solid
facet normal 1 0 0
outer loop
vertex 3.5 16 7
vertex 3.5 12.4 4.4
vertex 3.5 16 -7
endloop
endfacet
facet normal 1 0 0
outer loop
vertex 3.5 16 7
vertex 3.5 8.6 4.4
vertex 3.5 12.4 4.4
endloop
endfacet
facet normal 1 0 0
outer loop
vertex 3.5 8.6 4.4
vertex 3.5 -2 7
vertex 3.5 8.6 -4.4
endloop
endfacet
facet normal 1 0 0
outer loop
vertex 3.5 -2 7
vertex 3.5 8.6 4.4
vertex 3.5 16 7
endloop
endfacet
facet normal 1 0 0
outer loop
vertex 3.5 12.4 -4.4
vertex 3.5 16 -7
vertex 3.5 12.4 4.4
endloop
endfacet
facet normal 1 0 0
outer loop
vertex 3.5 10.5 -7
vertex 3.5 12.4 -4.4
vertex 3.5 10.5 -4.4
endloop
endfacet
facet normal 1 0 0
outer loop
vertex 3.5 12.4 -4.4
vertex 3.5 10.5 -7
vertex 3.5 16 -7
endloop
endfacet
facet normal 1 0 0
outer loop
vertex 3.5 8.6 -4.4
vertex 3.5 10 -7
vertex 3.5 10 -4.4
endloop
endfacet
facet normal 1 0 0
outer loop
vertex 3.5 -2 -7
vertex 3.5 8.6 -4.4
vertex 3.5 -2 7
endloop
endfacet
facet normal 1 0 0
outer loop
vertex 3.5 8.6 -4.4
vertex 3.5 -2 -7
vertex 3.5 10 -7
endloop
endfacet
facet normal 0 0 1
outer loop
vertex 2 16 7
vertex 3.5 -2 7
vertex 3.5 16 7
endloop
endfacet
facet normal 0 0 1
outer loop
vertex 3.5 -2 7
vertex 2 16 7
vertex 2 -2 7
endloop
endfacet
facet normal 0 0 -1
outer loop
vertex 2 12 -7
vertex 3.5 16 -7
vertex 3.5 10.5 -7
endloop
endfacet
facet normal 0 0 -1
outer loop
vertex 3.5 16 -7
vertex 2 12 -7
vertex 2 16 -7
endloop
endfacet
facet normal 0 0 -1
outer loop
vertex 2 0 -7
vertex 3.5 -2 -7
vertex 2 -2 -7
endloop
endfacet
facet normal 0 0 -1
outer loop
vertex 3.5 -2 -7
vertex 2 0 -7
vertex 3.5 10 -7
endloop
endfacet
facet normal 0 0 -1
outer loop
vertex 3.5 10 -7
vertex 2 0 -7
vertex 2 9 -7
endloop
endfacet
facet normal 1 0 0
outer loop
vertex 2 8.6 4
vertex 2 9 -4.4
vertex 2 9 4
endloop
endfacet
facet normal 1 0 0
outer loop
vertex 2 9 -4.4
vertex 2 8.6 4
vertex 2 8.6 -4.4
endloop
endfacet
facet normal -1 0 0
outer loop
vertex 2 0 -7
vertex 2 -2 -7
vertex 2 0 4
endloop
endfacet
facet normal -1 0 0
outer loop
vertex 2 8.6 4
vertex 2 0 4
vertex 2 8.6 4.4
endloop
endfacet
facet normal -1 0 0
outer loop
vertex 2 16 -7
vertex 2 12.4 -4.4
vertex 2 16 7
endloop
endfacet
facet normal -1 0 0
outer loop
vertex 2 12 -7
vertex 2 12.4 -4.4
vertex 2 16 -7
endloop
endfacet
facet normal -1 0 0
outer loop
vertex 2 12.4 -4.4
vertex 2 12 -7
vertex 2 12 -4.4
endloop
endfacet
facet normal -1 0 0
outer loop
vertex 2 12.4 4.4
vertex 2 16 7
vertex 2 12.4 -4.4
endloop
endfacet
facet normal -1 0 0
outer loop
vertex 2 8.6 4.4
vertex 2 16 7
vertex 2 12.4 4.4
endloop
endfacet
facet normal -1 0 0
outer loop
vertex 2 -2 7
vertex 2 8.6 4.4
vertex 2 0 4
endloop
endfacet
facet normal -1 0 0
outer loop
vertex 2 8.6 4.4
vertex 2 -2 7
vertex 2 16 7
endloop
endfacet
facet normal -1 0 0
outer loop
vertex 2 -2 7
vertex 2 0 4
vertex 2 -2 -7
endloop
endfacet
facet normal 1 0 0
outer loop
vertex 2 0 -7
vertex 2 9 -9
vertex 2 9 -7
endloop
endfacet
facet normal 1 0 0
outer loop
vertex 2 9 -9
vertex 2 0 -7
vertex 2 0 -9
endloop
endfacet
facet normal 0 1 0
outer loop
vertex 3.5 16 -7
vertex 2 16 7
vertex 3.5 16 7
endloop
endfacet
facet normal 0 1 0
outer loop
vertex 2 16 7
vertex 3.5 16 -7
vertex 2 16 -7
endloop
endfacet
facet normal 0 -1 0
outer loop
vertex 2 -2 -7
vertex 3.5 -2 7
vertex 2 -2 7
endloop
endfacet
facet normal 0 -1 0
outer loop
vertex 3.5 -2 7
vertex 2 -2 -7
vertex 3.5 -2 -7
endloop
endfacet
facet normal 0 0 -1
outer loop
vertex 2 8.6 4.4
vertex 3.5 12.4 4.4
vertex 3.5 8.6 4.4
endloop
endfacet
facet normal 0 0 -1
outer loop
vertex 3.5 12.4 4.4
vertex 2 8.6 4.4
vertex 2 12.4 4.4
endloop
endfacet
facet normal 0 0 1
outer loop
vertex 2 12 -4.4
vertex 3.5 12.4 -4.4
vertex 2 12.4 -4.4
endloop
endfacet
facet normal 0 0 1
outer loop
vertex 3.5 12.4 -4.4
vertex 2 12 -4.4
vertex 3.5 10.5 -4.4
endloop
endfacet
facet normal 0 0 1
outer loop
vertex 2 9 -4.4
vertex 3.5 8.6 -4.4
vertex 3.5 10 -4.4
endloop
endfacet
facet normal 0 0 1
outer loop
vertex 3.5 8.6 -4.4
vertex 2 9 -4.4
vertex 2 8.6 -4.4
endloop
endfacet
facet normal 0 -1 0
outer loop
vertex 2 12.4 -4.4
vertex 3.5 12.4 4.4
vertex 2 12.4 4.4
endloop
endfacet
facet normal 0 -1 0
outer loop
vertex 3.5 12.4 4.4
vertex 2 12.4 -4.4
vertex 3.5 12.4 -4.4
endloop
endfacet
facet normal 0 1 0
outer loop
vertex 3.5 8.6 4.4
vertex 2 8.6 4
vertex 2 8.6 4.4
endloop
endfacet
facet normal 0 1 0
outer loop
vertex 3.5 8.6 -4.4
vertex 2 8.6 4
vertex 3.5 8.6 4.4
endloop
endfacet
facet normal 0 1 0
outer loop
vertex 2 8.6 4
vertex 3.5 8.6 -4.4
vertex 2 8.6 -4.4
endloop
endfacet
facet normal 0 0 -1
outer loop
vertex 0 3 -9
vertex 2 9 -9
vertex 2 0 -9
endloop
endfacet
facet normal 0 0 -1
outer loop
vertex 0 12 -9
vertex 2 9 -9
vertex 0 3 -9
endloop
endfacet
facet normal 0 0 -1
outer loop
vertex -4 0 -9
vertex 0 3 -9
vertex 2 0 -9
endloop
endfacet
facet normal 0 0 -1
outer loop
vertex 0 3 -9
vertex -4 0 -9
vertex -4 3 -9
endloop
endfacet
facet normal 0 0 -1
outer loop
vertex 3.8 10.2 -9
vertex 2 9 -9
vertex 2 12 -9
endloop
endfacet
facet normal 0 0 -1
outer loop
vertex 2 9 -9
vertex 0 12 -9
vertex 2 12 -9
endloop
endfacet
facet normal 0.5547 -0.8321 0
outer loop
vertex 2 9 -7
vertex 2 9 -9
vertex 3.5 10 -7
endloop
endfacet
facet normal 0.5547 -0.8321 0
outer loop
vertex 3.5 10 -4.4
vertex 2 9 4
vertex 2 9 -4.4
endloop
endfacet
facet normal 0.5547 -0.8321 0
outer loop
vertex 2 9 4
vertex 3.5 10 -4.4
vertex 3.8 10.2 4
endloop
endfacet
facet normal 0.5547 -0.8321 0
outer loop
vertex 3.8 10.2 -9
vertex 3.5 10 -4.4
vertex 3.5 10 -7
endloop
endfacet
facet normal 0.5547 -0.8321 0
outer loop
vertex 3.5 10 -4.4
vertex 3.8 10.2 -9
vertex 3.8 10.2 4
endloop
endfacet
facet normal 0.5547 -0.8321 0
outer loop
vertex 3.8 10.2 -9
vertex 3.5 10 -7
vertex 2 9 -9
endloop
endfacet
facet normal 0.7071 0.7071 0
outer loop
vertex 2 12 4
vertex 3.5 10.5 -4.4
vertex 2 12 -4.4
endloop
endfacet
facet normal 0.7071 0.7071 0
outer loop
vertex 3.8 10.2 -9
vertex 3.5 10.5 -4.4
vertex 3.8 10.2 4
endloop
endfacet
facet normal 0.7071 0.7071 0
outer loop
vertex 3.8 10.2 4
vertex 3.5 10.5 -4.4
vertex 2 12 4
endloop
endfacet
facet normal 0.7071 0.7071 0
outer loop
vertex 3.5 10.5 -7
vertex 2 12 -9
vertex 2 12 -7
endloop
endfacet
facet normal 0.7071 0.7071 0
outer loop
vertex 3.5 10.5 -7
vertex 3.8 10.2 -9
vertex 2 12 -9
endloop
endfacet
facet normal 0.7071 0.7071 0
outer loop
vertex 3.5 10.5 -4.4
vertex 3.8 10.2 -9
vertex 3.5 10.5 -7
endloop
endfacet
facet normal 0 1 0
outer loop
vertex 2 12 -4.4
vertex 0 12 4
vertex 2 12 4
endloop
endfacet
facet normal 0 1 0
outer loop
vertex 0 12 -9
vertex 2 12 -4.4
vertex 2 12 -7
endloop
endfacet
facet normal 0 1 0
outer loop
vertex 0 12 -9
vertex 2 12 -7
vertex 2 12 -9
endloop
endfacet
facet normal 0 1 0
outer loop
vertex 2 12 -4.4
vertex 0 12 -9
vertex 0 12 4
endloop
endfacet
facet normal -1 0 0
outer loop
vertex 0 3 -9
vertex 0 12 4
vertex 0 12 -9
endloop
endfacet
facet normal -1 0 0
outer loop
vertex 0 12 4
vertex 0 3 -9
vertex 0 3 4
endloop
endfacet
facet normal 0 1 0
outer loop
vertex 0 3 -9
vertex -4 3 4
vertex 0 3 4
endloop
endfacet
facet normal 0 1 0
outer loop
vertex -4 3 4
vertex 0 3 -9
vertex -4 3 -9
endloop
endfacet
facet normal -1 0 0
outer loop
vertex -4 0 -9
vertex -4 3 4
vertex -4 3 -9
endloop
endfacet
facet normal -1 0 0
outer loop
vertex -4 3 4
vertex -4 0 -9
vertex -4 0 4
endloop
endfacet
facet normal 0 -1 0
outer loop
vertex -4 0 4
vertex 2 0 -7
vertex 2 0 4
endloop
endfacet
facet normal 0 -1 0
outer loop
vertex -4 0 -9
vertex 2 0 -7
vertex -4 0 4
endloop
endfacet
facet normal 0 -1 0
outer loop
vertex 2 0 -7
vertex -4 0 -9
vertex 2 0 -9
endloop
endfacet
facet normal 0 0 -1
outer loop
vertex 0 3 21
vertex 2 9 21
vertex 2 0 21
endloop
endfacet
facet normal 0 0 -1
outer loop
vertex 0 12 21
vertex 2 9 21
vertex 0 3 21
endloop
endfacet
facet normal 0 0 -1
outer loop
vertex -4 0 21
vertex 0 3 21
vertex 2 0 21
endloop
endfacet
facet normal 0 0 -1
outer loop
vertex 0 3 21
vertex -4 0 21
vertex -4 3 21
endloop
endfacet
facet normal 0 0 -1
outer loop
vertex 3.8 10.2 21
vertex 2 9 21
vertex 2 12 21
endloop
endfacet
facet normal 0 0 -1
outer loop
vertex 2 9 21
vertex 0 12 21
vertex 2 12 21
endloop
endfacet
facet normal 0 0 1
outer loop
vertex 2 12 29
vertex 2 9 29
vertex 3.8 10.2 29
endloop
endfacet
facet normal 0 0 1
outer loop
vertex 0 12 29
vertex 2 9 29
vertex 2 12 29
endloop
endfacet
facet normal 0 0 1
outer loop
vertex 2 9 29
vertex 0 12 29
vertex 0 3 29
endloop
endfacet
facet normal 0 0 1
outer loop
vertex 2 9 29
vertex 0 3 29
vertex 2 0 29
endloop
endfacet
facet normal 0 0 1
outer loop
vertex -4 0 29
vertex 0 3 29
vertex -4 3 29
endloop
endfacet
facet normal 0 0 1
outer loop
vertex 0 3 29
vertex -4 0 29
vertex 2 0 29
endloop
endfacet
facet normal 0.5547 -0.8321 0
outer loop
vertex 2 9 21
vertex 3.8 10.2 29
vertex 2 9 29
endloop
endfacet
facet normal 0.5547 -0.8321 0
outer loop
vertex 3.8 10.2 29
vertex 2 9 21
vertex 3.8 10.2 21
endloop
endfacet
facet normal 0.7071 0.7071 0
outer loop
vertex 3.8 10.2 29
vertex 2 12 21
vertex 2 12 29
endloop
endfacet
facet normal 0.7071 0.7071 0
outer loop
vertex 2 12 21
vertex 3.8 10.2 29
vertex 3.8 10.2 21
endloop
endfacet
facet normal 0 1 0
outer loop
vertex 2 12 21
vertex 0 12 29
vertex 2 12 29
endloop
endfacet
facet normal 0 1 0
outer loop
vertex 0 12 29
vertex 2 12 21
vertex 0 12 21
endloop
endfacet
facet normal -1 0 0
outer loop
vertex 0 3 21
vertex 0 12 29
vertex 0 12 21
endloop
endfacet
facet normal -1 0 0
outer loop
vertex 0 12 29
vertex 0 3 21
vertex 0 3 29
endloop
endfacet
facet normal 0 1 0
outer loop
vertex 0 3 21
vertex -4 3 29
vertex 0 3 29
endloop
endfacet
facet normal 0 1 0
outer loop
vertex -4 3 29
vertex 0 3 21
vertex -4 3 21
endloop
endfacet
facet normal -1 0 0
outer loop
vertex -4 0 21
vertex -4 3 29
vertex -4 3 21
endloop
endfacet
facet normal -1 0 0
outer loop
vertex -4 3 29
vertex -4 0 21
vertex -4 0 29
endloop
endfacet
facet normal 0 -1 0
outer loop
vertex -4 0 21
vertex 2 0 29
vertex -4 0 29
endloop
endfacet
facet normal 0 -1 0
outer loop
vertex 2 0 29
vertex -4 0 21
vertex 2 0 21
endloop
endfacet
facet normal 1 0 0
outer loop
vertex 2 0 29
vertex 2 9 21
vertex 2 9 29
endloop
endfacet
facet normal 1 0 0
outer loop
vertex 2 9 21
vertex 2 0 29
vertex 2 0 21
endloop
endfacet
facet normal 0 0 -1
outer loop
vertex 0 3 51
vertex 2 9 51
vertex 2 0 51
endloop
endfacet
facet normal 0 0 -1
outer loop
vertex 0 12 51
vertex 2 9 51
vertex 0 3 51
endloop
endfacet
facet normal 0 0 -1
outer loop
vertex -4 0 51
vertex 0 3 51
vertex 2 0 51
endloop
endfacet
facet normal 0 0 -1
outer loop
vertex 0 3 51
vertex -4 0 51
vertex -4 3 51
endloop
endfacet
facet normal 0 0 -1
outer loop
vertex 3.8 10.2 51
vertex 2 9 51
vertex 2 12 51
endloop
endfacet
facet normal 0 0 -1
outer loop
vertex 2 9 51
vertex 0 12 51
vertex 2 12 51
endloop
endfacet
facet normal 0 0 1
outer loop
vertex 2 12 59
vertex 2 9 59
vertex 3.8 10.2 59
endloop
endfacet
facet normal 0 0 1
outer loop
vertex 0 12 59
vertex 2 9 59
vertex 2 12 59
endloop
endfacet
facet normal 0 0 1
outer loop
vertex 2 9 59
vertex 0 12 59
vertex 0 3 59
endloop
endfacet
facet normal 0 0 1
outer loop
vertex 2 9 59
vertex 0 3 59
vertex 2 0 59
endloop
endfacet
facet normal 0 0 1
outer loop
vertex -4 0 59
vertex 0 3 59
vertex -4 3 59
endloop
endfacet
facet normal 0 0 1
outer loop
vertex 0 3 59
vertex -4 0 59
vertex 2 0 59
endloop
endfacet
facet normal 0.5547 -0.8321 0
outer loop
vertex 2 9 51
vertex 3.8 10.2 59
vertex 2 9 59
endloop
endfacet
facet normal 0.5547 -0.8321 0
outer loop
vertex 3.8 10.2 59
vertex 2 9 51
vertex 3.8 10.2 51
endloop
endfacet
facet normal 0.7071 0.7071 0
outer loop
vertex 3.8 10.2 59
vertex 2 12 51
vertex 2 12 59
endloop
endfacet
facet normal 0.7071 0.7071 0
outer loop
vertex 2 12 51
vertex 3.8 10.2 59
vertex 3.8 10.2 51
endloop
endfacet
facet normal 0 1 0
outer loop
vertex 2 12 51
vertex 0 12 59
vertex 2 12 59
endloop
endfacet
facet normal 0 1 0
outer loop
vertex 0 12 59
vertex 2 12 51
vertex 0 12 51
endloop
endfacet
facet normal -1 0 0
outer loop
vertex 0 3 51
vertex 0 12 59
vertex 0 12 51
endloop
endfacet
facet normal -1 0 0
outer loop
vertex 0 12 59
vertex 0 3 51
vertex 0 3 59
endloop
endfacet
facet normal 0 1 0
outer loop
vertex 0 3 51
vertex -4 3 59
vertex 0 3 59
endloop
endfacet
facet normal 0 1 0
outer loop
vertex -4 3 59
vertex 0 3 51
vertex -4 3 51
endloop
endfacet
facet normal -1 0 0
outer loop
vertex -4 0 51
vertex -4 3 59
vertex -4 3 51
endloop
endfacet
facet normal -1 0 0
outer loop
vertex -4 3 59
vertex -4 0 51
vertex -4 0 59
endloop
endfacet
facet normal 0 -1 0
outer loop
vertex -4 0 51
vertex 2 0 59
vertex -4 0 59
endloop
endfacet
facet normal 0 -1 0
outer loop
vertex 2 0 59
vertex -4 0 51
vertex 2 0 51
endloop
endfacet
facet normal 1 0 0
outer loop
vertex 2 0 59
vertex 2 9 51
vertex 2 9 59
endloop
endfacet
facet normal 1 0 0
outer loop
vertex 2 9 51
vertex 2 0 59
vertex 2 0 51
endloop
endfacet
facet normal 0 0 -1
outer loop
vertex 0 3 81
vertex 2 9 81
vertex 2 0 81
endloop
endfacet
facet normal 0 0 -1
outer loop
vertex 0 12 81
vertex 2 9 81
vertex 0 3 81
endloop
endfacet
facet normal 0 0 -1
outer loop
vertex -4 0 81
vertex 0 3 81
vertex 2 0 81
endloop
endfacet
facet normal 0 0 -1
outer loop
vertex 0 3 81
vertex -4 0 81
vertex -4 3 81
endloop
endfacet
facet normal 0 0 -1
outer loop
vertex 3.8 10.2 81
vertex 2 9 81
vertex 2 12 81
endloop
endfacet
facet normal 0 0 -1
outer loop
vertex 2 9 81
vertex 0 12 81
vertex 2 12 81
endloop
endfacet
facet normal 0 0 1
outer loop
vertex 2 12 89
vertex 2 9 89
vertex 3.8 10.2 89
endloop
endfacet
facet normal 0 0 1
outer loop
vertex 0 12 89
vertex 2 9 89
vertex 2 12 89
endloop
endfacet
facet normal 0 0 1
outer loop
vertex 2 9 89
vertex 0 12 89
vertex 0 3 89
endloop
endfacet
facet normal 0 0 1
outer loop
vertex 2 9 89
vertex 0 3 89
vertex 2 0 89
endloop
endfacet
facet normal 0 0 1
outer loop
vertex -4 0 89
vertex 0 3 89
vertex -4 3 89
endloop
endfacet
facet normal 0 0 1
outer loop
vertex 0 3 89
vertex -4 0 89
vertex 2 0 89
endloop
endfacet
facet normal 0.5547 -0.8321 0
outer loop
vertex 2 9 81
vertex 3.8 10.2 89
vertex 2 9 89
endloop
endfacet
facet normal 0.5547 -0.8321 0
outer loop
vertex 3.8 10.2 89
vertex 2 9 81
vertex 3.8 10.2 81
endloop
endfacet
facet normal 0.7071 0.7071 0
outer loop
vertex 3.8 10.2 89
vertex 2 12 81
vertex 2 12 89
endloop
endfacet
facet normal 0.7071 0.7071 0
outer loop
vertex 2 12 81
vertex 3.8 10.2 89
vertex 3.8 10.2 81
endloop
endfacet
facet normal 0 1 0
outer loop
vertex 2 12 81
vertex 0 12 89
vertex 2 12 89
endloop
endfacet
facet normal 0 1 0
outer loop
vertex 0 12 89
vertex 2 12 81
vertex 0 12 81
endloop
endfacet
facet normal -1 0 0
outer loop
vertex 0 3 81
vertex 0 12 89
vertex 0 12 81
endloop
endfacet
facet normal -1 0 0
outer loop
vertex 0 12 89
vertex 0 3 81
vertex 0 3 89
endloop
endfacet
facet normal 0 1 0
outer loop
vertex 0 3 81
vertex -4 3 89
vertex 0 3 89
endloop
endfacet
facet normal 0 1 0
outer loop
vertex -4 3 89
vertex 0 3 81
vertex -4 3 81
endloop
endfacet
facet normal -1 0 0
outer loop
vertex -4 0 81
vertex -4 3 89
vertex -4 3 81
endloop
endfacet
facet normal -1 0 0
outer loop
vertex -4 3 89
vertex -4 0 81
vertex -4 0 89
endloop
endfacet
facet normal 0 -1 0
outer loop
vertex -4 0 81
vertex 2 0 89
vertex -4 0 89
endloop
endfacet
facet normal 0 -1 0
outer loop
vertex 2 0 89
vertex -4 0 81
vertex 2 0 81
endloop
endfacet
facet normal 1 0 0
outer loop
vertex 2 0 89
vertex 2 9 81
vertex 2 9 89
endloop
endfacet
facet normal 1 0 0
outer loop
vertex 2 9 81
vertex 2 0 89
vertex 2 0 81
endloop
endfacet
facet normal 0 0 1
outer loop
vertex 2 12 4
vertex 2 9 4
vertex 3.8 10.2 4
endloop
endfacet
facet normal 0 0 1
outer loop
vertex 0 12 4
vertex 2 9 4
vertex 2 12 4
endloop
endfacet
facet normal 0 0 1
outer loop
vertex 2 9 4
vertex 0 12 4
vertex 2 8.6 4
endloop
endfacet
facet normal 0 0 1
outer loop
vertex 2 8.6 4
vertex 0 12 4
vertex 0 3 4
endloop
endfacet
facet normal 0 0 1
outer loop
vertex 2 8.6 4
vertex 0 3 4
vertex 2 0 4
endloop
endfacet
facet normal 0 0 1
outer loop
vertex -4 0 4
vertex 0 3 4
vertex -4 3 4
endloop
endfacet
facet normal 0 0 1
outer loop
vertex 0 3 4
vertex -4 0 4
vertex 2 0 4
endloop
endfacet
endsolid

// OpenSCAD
// file: ../params.scad
// ============================================================
//  FOAM DART BLASTER — SHARED PARAMETERS
// ============================================================
//  Every part file includes this so all pieces agree on
//  dart size, clearances, and material. Change a number here
//  and every part updates. Units are millimeters.
//
//  Design target: spring-plunger blaster firing standard
//  Nerf Elite foam darts (the blue/orange 72mm foam darts).
// ============================================================

// ---------- THE DART (do not guess — measure yours) ----------
// Standard Nerf Elite dart, measured with calipers:
dart_od        = 13.0;   // foam outer diameter
dart_len       = 72.0;   // full dart length incl. tip
dart_tip_len   = 8.0;    // soft tip length (front)

// ---------- FIT / TOLERANCE ----------
// FDM prints come out a touch oversized on holes. These are the
// clearances added so foam feeds and parts slide. Carbon-fiber
// filaments print dimensionally stiff, so ~0.3–0.4mm is a good
// sliding fit. Tune after a test print.
barrel_clearance   = 0.4;   // added to dart_od for the barrel bore
slide_clearance    = 0.35;  // sliding fits (plunger, priming rail)
press_clearance    = 0.10;  // press/pin fits
screw_clearance    = 0.30;  // clearance holes for screws

// ---------- WALLS / GENERAL ----------
wall           = 3.0;    // default structural wall thickness
$fn            = 96;     // curve smoothness for preview/render

// ---------- HARDWARE (buy these — sizes we'll design around) ----------
main_spring_od     = 18.0;  // main plunger spring outer dia
main_spring_len    = 90.0;  // free length
main_spring_wire   = 1.4;   // wire gauge
trigger_spring_od  = 6.0;   // small return spring for trigger
mag_spring_od      = 10.0;  // magazine follower spring
screw_dia          = 3.0;   // M3 body screws
pin_dia            = 3.0;   // 3mm steel pivot pins

// ============================================================
//  MATERIAL PLAN  (what filament each part should print in)
// ============================================================
//  Filled in as we design each part. "CF" = carbon-fiber
//  reinforced (needs a hardened steel nozzle!).
//
//   Part            Material         Why
//   --------------  ---------------  --------------------------
//   Barrel          CF-PLA/PETG      rigid, smooth bore
//   Plunger tube    CF-Nylon/PETG    takes repeated stress
//   Plunger head    PLA + rubber     seal surface
//   Trigger/catch   CF-Nylon         high wear, must not snap
//   Priming handle  CF-PLA           stiffness
//   Shell halves    PLA or PETG      big, cosmetic, low stress
//   Grip            TPU or PLA       comfort vs. rigidity
// ============================================================
// file: ../lib/snapfit.scad
// ============================================================
//  SNAP-FIT LIBRARY — cantilever hooks + catch windows
// ============================================================
//  Two mating pieces:
//    * snap_hook()  -> the little hook/barb tab (goes on shell A)
//    * snap_catch() -> a plate with a window the barb locks into
//                      (in a real shell you SUBTRACT snap_window()
//                       from shell B's edge instead of adding a plate)
//
//  How it locks / releases:
//    - Insertion: the barb's shallow top ramp lets it flex inward
//      and slide through the window, then spring back out = LOCKED.
//    - Release: the barb's underside (retention face) is ANGLED, so
//      a firm pull cams it back inward and it pops free = EASY APART.
//    Raise `snap_ret_rise` -> easier to pull apart.
//    Lower it toward 0 -> grips harder (0 ≈ permanent).
//
//  LOCAL FRAME for these modules:
//    +X = barb protrusion direction
//    +Y = height / insertion travel
//     Z = clip width (centered on 0)
//  Place/rotate them onto the shell edge as needed.
// ============================================================

include <../params.scad>

// ---- snap tuning (adjust to taste, then reprint one to test) ----
snap_w         = 8.0;   // clip width
snap_t         = 2.0;   // beam thickness — thinner = flexier/easier
snap_len       = 12.0;  // cantilever length — longer = flexier
snap_barb      = 1.8;   // how far the barb sticks out (the "bite")
snap_barb_h    = 3.0;   // barb height along the beam
snap_ret_rise  = 1.2;   // retention-face slope; bigger = easier release
snap_base_d    = 4.0;   // foot that bonds the hook to the shell wall
snap_base_h    = 3.0;   // foot height
snap_win_clear = 0.4;   // clearance around the barb in the window

// --- the hook/barb tab -------------------------------------------
module snap_hook() {
    zb = snap_len - snap_barb_h;   // where the barb starts up the beam
    linear_extrude(height = snap_w, center = true) {
        // beam + barb (profile: X = protrusion, Y = height)
        polygon([
            [0, 0],
            [snap_t, 0],
            [snap_t, zb],
            [snap_t + snap_barb, zb + snap_ret_rise], // angled retention face
            [snap_t, snap_len],                        // shallow insertion ramp
            [0, snap_len],
        ]);
        // foot: bonds flat onto the shell wall behind the beam
        polygon([
            [-snap_base_d, 0],
            [0, 0],
            [0, snap_base_h],
            [-snap_base_d, snap_base_h],
        ]);
    }
}

// --- the window NEGATIVE: subtract this from shell B's edge wall ---
// wall_th = thickness of the wall you're cutting the window into.
module snap_window(wall_th = 1.5) {
    zb  = snap_len - snap_barb_h;
    wh  = snap_barb_h + 2*snap_win_clear;   // window height
    ww  = snap_w + 2*snap_win_clear;        // window width
    translate([snap_t - 0.5, zb - snap_win_clear, -ww/2])
        cube([wall_th + 1.0, wh, ww]);
}

// --- a demo catch plate (for visualizing engagement only) ---------
module snap_catch(plate_th = 1.5) {
    difference() {
        translate([snap_t, -2, -(snap_w/2 + 3)])
            cube([plate_th, snap_len + 6, snap_w + 6]);
        snap_window(plate_th);
    }
}
// main file
// ============================================================
//  DEMO — see the snap-fit hook engage its catch window
// ============================================================
//  Open in OpenSCAD, press F5. The blue hook's barb pokes
//  through the window in the silver catch plate = locked.
//  This just visualizes the fit; the real shell will use
//  snap_hook() on one half and snap_window() cut into the other.
// ============================================================

include <../lib/snapfit.scad>

// hook on shell A
color("SteelBlue") snap_hook();

// catch on shell B (barb should poke through the window)
color("Silver")    snap_catch();

// --- a full edge: several hooks spaced along a shell rim ---
translate([0, 0, 40]) {
    edge_len   = 90;
    hook_pitch = 30;   // spacing between hooks
    for (z = [0 : hook_pitch : edge_len])
        translate([0, 0, z - edge_len/2])
            color("SteelBlue") snap_hook();
}
